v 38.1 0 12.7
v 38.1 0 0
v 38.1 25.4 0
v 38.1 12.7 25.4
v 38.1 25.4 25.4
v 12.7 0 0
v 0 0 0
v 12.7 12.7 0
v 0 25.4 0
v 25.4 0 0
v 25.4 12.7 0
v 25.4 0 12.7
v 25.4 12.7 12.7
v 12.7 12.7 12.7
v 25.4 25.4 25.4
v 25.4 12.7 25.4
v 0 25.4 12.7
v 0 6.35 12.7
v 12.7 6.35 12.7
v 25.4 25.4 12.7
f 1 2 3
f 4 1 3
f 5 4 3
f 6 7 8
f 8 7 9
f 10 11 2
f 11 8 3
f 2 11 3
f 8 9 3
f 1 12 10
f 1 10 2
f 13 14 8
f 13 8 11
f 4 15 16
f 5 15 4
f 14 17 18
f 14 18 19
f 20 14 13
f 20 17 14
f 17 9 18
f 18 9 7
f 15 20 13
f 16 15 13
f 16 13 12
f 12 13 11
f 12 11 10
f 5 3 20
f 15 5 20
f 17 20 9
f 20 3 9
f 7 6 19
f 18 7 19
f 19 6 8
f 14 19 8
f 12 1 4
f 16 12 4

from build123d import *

# Parameters (mm, degrees)
F1_DEPTH = 25.4
F2_DEPTH = 12.7
F4_DEPTH = 25.4
F6_DEPTH = 25.4


with BuildPart() as f1:
    # F0 (on Top) → F1 (new body)
    with BuildSketch(Plane.XY):
        Polygon((38.1, 25.4), (25.4, 25.4), (25.4, 12.7), (25.4, 0), (38.1, 0), align=None)
    extrude(amount=F1_DEPTH)

    # F0 (on Top) → F2 (join)
    with BuildSketch(Plane.XY):
        Polygon((0, 25.4), (0, 0), (12.7, 0), (12.7, 12.7), (25.4, 12.7), (25.4, 25.4), align=None)
        Polygon((38.1, 25.4), (25.4, 25.4), (25.4, 12.7), (25.4, 0), (38.1, 0), align=None)
    extrude(amount=F2_DEPTH)

    # F3 (on face) → F4 (cut)
    with BuildSketch(Plane.YZ.offset(12.7)):
        Polygon((0, 0), (6.35, 12.7), (0, 12.7), align=None)
    extrude(amount=-F4_DEPTH, mode=Mode.SUBTRACT)

    # F5 (on face) → F6 (cut)
    with BuildSketch(Plane.YZ.offset(38.1)):
        Polygon((0, 12.7), (12.7, 25.4), (0, 25.4), align=None)
    extrude(amount=-F6_DEPTH, mode=Mode.SUBTRACT)


solid = f1.part
